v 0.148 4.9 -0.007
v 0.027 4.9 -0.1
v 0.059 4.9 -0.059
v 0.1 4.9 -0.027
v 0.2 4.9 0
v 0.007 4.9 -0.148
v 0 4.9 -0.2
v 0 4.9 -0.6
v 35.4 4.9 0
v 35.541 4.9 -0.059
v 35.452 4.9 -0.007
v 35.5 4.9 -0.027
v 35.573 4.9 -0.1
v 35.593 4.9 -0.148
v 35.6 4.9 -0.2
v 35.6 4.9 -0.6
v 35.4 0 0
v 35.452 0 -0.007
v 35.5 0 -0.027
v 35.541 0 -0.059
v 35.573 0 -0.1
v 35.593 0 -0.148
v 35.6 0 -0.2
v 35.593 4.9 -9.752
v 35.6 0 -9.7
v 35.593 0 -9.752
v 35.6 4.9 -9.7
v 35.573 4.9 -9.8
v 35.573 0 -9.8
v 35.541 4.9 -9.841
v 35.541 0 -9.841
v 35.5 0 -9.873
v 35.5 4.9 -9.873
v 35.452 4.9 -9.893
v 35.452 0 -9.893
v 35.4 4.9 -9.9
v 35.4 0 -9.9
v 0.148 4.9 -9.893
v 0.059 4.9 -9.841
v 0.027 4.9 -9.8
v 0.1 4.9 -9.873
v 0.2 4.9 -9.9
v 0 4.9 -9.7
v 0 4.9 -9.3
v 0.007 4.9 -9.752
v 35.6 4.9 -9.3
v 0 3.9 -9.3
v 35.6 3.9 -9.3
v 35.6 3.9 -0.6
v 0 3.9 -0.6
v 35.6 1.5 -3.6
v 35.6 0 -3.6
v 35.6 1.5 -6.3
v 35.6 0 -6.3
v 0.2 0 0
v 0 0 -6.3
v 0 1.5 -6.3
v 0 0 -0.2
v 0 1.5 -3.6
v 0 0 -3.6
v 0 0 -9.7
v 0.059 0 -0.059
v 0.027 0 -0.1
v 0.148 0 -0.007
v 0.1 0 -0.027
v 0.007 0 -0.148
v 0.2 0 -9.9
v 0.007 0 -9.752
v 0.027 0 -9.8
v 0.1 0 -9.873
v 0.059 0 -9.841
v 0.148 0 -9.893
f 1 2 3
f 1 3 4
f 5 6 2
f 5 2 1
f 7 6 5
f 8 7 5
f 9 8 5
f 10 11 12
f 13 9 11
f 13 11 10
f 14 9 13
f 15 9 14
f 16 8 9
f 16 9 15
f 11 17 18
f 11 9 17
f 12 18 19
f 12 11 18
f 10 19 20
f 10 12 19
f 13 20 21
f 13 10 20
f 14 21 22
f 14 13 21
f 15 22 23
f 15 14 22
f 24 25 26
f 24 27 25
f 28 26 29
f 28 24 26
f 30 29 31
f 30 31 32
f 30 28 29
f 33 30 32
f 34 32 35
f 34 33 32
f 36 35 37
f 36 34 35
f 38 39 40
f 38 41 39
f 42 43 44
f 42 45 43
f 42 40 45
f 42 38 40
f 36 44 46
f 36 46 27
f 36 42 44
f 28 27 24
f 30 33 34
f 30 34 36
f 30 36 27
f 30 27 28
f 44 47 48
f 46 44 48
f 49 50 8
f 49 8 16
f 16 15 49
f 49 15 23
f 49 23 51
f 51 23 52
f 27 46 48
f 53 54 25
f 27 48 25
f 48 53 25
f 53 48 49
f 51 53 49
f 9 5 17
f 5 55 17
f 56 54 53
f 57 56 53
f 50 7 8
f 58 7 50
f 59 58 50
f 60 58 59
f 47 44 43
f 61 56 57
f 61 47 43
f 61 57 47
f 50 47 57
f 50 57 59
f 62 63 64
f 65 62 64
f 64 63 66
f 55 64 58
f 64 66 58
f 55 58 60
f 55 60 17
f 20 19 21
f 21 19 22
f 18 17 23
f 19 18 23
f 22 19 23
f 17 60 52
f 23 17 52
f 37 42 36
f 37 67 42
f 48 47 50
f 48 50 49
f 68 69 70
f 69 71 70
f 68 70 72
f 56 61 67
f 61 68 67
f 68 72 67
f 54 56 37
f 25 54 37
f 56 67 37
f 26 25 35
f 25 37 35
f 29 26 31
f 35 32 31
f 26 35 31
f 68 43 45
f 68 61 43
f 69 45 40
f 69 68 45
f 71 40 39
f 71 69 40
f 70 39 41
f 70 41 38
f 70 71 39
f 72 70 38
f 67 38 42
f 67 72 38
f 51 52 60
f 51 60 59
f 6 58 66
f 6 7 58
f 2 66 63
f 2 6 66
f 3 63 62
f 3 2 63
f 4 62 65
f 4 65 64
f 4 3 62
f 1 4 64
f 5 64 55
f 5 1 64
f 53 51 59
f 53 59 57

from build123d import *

# Parameters (mm, degrees)
ESQUISSE1_W             = 35.6
ESQUISSE1_H             = 9.9
BOSS_EXTRU_1_DEPTH      = 3.9
ESQUISSE2_W             = 2.7
ESQUISSE2_H             = 1.5
ENL_V_MAT_EXTRU_1_DEPTH = 36.6
ESQUISSE3_W             = 35.6
ESQUISSE3_H             = 0.6
BOSS_EXTRU_2_DEPTH      = 1
CONG_1_R                = 0.2


with BuildPart() as part:
    # Esquisse1 → Boss.-Extru.1 (new body)
    with BuildSketch(Plane(origin=(0, 0, 0), x_dir=(1, 0, 0), z_dir=(0, 1, 0))):
        with Locations((17.8, 4.95)):
            Rectangle(ESQUISSE1_W, ESQUISSE1_H)
    extrude(amount=BOSS_EXTRU_1_DEPTH)

    # Esquisse2 → Enlèv. mat.-Extru.1 (cut, through all)
    with BuildSketch(Plane(origin=(35.6, 0, 0), x_dir=(0, 0, -1), z_dir=(1, 0, 0))):
        with Locations((4.95, 0.75)):
            Rectangle(ESQUISSE2_W, ESQUISSE2_H)
    extrude(amount=-ENL_V_MAT_EXTRU_1_DEPTH, mode=Mode.SUBTRACT)

    # Esquisse3 → Boss.-Extru.2 (add)
    with BuildSketch(Plane(origin=(0, 3.9, 0), x_dir=(1, 0, 0), z_dir=(0, 1, 0))):
        with Locations((17.8, 0.3)):
            Rectangle(ESQUISSE3_W, ESQUISSE3_H)
        with Locations((17.8, 9.6)):
            Rectangle(ESQUISSE3_W, ESQUISSE3_H)
    extrude(amount=BOSS_EXTRU_2_DEPTH)

    # Congé1
    cong_1_edges = [part.edges().sort_by_distance(p)[0] for p in [
        (0, 2.45, -9.9),
        (35.6, 2.45, -9.9),
        (35.6, 2.45, 0),
        (0, 2.45, 0),
    ]]
    fillet(cong_1_edges, radius=CONG_1_R)


solid = part.part
